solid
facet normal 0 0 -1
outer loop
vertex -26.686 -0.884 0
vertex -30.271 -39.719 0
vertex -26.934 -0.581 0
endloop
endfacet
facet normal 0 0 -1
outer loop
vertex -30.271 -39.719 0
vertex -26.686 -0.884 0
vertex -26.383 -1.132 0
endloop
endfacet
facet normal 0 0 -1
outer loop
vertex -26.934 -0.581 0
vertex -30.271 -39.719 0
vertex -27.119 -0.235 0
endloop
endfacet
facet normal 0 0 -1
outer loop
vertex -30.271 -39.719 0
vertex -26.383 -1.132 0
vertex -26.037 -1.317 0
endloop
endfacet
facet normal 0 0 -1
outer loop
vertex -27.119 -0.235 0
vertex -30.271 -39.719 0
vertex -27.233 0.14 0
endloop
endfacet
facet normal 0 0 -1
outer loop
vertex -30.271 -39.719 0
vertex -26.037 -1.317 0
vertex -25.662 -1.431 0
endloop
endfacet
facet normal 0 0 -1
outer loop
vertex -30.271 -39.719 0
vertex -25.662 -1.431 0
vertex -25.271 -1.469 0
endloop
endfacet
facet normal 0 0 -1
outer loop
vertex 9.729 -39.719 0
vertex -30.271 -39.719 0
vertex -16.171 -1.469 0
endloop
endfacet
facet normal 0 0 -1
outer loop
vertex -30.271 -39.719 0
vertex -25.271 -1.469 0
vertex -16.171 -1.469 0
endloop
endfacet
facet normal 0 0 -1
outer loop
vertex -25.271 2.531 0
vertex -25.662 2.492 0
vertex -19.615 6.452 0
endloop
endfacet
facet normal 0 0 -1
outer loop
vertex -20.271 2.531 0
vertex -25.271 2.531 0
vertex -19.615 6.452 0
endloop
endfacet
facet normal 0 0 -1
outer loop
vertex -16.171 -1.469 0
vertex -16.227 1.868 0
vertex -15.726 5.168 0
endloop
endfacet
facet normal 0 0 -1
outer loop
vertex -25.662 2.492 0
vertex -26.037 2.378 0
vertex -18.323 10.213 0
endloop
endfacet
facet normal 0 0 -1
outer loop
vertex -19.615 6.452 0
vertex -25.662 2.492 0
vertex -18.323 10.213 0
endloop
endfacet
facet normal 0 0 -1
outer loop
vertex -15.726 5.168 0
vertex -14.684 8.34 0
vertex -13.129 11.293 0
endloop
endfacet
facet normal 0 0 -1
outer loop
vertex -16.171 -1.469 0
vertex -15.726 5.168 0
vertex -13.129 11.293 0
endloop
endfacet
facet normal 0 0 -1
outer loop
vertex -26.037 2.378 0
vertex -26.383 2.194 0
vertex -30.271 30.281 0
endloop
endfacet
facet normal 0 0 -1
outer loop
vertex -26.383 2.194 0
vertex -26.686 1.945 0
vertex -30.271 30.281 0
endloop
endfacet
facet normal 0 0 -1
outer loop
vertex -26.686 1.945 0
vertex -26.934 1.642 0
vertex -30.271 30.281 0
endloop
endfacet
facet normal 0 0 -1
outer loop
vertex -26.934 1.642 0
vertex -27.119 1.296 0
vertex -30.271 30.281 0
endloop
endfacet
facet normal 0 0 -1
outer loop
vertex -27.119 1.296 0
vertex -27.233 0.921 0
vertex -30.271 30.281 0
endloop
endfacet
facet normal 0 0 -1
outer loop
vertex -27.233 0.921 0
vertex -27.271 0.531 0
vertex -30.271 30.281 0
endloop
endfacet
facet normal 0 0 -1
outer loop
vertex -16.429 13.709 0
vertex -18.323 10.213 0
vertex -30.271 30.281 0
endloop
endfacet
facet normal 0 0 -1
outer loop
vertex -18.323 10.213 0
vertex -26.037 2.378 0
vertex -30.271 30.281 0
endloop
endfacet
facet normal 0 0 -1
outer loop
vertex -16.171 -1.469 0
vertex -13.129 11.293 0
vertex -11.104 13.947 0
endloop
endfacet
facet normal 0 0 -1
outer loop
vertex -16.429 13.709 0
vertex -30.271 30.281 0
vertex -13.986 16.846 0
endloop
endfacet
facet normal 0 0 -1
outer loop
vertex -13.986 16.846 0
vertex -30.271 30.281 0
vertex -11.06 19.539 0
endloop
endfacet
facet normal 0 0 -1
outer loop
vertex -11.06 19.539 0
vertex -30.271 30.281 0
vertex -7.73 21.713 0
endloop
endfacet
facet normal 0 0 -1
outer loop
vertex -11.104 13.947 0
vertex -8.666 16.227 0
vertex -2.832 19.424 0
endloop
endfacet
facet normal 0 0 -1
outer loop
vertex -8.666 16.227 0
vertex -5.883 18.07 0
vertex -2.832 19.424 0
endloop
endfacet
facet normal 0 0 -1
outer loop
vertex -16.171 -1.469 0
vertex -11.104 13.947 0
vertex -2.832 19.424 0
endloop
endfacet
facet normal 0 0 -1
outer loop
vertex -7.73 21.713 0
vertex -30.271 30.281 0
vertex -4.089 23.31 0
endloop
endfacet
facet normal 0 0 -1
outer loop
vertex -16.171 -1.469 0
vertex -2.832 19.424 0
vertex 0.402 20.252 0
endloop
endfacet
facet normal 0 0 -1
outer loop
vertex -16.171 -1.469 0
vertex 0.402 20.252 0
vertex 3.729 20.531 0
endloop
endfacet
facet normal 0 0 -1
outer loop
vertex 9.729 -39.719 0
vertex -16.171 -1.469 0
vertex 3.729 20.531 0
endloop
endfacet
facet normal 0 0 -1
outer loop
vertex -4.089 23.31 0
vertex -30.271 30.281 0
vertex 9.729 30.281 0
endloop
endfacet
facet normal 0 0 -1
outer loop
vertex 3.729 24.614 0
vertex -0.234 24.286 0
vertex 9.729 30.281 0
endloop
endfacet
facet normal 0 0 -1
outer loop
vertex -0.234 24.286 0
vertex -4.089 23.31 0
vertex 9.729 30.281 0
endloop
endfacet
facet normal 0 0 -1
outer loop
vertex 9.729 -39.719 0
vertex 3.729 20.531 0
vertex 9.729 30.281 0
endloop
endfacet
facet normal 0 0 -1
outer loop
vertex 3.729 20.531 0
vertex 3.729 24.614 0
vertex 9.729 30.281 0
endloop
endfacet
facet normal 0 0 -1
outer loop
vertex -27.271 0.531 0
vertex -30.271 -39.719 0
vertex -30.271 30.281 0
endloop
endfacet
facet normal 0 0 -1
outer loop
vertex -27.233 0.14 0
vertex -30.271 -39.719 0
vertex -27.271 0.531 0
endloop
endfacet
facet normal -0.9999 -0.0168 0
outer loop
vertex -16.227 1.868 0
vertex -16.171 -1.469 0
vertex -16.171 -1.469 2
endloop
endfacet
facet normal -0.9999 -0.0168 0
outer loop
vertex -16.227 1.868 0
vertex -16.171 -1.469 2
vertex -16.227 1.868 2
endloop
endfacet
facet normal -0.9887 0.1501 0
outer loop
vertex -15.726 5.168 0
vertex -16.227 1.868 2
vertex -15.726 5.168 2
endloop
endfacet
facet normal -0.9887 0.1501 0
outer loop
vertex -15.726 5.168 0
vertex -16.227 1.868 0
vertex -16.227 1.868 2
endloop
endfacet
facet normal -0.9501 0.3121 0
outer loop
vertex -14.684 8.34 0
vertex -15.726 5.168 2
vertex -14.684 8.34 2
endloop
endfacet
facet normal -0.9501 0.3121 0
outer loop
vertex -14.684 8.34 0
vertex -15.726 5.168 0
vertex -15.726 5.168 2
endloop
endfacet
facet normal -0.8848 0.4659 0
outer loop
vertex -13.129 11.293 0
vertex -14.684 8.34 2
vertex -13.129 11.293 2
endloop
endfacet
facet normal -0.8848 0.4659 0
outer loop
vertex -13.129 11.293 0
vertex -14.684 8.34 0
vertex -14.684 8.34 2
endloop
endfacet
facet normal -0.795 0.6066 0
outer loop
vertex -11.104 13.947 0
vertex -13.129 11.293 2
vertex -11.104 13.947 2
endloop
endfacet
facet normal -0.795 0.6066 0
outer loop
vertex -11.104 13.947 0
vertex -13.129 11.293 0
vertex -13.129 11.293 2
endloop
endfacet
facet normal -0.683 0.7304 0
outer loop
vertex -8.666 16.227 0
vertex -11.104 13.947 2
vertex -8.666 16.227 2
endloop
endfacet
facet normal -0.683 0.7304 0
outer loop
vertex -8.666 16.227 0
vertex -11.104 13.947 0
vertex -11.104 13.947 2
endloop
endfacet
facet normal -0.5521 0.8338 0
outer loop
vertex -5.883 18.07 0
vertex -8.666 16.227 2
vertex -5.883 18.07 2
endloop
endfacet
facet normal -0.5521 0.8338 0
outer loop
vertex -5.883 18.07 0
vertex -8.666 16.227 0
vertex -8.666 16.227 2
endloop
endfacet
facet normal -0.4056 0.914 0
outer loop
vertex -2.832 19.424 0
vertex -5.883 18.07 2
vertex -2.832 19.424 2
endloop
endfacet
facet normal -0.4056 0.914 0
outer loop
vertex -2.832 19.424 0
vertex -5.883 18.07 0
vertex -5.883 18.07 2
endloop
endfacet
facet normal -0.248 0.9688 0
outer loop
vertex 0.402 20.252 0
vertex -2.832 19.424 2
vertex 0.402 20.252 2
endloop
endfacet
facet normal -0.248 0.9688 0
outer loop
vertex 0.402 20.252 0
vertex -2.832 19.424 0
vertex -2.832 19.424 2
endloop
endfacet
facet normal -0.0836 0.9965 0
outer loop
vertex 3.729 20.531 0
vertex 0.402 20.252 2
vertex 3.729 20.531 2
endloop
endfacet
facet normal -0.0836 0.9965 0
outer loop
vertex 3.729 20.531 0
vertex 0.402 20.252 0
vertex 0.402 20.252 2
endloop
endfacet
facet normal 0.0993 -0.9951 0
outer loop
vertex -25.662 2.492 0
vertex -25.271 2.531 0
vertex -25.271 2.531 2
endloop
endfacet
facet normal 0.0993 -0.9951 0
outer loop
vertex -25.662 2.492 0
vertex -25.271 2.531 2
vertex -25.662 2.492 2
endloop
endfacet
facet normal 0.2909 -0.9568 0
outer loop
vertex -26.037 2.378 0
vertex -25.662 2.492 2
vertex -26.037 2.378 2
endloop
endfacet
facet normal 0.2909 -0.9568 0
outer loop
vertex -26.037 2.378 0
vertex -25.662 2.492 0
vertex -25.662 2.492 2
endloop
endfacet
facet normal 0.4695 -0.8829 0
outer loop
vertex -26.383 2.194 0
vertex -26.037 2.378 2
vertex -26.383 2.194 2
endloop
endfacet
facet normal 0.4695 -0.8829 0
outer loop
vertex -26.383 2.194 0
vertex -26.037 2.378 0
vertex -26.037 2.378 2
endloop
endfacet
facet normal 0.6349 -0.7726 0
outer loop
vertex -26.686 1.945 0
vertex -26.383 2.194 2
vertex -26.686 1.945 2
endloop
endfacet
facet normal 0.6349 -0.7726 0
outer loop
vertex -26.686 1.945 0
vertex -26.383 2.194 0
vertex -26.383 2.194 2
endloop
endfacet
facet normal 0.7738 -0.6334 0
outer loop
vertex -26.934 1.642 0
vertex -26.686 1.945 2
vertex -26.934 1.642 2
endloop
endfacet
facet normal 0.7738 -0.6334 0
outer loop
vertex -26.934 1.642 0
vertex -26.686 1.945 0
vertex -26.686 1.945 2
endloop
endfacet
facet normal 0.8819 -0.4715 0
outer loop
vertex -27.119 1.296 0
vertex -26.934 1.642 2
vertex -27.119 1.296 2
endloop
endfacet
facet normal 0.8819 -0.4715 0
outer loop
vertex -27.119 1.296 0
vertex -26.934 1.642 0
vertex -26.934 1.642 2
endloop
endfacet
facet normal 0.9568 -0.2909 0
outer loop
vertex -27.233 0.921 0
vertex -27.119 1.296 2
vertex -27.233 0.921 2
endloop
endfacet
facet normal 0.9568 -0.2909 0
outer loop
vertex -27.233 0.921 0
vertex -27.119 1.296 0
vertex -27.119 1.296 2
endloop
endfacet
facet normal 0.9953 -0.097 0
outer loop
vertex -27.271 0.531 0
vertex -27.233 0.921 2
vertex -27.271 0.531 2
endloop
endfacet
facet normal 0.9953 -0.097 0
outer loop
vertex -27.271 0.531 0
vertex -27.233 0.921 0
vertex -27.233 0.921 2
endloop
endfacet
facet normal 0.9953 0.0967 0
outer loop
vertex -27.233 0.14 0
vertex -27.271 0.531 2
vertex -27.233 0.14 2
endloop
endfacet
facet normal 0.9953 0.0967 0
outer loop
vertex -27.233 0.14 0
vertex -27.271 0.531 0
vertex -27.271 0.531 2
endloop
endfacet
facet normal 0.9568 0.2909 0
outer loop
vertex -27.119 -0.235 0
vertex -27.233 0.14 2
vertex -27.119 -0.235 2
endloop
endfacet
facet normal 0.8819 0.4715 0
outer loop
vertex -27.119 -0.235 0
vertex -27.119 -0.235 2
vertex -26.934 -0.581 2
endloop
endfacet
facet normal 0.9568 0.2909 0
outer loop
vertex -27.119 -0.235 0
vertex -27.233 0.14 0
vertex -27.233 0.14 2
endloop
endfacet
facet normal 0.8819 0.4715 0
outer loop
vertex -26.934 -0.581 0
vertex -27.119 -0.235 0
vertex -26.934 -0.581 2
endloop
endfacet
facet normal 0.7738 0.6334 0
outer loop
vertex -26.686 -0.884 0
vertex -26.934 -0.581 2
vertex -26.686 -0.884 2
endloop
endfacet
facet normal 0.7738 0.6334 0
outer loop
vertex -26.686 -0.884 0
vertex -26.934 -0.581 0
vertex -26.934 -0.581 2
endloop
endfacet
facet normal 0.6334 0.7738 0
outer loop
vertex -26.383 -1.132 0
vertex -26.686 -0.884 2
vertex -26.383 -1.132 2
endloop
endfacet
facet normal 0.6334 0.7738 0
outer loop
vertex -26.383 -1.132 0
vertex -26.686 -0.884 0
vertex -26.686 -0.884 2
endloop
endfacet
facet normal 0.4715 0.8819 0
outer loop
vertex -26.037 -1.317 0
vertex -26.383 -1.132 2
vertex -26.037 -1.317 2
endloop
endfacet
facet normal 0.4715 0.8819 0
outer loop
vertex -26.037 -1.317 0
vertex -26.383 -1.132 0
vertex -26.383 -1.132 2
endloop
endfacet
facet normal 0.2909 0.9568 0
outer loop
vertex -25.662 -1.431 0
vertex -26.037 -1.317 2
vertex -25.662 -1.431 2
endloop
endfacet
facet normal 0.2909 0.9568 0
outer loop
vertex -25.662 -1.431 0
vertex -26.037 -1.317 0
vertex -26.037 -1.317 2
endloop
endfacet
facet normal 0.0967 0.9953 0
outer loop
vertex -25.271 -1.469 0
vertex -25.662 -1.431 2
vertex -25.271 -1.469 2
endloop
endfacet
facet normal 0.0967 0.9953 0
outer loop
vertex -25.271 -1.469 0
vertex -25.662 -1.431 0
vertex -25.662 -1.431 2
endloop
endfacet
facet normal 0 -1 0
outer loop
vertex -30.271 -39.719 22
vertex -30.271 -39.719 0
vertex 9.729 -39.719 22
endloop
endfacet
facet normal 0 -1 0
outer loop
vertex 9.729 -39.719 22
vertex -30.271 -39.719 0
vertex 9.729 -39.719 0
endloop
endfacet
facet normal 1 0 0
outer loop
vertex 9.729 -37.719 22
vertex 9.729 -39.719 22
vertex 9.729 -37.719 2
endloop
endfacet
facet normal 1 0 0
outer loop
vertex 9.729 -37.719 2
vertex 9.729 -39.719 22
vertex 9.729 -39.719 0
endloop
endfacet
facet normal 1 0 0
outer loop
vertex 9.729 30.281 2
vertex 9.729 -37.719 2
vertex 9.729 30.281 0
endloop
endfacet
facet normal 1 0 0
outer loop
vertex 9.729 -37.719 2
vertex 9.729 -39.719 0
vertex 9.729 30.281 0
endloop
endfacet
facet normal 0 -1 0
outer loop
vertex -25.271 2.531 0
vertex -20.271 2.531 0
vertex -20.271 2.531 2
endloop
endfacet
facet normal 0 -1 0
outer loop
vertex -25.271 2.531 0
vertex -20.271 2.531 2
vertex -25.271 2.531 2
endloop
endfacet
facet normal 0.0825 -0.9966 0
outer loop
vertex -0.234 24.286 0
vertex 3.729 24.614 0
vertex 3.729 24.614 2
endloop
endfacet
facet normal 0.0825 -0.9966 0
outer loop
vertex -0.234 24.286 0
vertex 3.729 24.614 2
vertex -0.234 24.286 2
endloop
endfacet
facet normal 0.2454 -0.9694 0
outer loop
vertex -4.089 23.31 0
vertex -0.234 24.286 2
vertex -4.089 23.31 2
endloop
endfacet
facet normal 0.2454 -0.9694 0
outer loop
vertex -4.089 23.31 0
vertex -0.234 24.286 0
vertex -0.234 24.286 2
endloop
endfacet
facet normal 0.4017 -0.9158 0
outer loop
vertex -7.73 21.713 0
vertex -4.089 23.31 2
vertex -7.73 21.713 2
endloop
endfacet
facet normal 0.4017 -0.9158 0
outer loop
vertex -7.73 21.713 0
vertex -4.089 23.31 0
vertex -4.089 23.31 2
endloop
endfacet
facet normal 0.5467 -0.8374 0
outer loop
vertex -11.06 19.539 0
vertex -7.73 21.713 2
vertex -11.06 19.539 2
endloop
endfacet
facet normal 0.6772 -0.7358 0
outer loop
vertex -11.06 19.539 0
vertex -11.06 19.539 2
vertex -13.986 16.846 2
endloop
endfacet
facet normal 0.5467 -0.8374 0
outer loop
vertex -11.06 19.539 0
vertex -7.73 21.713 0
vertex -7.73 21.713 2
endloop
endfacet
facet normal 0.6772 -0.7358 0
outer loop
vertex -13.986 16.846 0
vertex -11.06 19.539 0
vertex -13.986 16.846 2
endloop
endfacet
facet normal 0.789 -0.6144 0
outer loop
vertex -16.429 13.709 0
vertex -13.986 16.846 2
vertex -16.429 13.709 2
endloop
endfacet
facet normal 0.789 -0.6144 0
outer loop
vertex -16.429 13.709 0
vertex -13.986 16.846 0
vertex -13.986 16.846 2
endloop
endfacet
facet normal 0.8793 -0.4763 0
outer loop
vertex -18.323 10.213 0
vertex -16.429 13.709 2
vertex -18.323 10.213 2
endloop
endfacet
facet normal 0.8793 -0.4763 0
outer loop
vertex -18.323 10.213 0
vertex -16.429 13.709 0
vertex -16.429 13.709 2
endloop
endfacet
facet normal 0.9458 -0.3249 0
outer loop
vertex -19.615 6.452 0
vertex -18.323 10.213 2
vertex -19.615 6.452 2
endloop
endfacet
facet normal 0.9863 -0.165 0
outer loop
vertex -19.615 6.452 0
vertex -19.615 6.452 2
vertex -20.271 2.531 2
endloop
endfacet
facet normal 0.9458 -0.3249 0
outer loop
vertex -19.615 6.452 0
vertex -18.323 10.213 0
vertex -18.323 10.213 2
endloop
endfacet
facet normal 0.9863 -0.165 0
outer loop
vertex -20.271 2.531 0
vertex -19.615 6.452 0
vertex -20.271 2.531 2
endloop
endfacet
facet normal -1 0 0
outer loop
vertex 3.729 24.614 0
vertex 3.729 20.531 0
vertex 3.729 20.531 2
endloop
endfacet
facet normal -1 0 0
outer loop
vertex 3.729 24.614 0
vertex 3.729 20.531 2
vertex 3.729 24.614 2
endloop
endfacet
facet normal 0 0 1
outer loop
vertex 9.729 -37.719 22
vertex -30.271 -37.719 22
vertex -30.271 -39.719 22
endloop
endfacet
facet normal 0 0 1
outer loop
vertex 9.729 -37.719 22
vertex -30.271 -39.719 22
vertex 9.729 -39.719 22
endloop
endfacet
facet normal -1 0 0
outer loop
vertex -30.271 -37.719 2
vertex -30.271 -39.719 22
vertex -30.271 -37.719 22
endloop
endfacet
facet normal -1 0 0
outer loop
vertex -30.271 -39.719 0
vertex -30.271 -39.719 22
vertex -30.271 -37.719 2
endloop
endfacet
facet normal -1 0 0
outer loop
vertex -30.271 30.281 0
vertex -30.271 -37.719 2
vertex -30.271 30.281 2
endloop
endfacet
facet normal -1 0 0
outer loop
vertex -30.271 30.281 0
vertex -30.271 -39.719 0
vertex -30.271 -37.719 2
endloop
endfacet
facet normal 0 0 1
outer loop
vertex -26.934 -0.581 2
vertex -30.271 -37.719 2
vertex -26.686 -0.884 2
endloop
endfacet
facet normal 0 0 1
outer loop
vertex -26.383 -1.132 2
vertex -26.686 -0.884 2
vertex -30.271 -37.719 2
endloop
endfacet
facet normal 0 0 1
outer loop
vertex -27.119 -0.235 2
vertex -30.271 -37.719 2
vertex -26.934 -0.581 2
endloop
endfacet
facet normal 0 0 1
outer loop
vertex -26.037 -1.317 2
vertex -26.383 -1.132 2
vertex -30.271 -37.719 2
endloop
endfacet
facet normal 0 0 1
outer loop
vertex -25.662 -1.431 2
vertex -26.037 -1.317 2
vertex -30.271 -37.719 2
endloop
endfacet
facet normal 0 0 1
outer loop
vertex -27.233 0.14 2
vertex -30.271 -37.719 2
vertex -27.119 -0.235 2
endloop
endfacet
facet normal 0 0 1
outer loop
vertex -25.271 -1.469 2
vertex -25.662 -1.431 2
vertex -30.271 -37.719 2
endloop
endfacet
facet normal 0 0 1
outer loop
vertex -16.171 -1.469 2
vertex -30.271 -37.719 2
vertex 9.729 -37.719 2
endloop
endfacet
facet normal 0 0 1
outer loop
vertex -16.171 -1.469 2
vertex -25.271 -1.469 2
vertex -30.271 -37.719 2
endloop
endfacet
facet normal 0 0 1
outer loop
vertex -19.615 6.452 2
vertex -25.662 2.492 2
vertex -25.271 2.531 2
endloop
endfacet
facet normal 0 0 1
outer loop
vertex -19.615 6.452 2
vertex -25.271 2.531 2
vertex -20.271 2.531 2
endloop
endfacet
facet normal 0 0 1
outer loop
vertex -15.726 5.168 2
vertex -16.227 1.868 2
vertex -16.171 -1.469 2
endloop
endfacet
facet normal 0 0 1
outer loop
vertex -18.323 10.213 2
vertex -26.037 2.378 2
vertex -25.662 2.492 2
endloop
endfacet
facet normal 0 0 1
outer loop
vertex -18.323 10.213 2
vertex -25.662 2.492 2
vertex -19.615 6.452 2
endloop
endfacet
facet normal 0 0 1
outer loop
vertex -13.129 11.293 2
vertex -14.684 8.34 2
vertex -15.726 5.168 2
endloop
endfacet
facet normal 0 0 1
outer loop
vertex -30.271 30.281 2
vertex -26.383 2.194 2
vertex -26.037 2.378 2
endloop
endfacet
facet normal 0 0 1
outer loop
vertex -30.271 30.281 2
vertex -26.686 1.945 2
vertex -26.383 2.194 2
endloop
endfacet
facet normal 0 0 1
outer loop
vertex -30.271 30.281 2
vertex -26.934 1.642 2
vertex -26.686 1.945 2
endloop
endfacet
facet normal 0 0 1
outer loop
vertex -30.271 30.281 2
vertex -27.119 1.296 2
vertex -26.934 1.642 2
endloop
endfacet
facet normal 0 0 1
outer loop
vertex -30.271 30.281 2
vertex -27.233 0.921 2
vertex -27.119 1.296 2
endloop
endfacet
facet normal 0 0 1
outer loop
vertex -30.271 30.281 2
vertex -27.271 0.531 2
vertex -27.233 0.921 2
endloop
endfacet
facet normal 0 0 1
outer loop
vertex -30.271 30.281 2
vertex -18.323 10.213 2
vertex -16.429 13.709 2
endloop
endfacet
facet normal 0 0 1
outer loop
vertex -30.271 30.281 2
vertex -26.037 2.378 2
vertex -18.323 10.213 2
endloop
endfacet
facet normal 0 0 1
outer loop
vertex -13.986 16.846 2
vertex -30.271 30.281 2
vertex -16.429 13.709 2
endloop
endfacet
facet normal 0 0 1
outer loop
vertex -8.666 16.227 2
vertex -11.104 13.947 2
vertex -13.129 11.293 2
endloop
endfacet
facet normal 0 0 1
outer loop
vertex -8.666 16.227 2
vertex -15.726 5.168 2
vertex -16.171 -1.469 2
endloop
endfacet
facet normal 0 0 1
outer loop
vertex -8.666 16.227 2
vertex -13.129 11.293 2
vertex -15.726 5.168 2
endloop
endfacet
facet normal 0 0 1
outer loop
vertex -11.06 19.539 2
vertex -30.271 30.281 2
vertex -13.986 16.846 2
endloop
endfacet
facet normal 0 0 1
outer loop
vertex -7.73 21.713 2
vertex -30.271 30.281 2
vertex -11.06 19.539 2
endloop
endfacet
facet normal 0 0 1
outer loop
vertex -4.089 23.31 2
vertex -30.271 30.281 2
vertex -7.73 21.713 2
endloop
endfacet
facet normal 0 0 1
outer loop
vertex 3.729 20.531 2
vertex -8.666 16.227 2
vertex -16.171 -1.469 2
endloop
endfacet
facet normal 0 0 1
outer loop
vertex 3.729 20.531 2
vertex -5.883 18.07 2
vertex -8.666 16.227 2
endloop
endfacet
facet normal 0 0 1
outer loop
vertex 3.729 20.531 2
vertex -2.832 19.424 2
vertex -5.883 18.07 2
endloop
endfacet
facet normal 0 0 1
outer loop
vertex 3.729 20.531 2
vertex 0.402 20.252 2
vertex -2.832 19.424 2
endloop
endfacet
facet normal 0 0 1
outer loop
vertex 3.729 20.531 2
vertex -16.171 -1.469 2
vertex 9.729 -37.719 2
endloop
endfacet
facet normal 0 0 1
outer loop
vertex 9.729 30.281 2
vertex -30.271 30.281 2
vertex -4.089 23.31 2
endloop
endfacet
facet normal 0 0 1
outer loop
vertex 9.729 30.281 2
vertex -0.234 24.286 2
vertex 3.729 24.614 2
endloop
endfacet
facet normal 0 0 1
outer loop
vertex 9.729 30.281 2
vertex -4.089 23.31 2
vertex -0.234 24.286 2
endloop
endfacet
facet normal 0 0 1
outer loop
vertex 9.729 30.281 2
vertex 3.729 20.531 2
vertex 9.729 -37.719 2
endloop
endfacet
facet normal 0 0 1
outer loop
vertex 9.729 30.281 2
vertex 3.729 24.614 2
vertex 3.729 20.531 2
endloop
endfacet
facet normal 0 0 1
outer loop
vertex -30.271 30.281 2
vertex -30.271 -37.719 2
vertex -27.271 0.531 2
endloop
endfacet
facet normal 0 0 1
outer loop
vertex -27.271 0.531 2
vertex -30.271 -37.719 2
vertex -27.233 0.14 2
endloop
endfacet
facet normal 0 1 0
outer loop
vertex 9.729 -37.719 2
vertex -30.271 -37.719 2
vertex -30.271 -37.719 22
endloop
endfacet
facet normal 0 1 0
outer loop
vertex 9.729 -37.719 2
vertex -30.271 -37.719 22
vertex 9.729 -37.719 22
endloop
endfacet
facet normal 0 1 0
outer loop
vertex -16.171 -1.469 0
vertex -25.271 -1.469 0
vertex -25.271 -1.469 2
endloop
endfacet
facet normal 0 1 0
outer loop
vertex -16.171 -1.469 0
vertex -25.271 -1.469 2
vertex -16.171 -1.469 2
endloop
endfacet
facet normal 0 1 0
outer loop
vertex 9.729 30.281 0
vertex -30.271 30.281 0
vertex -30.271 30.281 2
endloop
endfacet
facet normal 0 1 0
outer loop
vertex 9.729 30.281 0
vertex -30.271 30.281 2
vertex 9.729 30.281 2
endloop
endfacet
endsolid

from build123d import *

# Parameters (mm, degrees)
SKETCH_1_W      = 40
SKETCH_1_H      = 70
EXTRUDE_1_DEPTH = 2
SKETCH_2_W      = 40
SKETCH_2_H      = 2
EXTRUDE_2_DEPTH = 20


with BuildPart() as part:
    # 草图1 → 凸台-拉伸1 (new body)
    with BuildSketch(Plane.XY):
        with Locations((-10.271445819, -4.719420773)):
            Rectangle(SKETCH_1_W, SKETCH_1_H)
        with BuildLine():
            Line((-25.271445819, -1.469420773), (-20.271445819, -1.469420773))
            Line((-20.271445819, -1.469420773), (-16.171194561, -1.469420773))
            ThreePointArc((-16.171194561, -1.469420773), (-11.103842793, 13.946987092), (3.728554181, 20.530579227))
            Line((3.728554181, 20.530579227), (3.728554181, 24.613768385))
            ThreePointArc((3.728554181, 24.613768385), (-12.578401723, 18.252971536), (-20.271445819, 2.530579227))
            Line((-20.271445819, 2.530579227), (-25.271445819, 2.530579227))
            ThreePointArc((-25.271445819, 2.530579227), (-27.271445819, 0.530579227), (-25.271445819, -1.469420773))
        make_face(mode=Mode.SUBTRACT)
    extrude(amount=EXTRUDE_1_DEPTH)

    # 草图2 → 凸台-拉伸2 (add)
    with BuildSketch(Plane.XY.offset(2)):
        with Locations((-10.271445819, -38.719420773)):
            Rectangle(SKETCH_2_W, SKETCH_2_H)
    extrude(amount=EXTRUDE_2_DEPTH)


solid = part.part
